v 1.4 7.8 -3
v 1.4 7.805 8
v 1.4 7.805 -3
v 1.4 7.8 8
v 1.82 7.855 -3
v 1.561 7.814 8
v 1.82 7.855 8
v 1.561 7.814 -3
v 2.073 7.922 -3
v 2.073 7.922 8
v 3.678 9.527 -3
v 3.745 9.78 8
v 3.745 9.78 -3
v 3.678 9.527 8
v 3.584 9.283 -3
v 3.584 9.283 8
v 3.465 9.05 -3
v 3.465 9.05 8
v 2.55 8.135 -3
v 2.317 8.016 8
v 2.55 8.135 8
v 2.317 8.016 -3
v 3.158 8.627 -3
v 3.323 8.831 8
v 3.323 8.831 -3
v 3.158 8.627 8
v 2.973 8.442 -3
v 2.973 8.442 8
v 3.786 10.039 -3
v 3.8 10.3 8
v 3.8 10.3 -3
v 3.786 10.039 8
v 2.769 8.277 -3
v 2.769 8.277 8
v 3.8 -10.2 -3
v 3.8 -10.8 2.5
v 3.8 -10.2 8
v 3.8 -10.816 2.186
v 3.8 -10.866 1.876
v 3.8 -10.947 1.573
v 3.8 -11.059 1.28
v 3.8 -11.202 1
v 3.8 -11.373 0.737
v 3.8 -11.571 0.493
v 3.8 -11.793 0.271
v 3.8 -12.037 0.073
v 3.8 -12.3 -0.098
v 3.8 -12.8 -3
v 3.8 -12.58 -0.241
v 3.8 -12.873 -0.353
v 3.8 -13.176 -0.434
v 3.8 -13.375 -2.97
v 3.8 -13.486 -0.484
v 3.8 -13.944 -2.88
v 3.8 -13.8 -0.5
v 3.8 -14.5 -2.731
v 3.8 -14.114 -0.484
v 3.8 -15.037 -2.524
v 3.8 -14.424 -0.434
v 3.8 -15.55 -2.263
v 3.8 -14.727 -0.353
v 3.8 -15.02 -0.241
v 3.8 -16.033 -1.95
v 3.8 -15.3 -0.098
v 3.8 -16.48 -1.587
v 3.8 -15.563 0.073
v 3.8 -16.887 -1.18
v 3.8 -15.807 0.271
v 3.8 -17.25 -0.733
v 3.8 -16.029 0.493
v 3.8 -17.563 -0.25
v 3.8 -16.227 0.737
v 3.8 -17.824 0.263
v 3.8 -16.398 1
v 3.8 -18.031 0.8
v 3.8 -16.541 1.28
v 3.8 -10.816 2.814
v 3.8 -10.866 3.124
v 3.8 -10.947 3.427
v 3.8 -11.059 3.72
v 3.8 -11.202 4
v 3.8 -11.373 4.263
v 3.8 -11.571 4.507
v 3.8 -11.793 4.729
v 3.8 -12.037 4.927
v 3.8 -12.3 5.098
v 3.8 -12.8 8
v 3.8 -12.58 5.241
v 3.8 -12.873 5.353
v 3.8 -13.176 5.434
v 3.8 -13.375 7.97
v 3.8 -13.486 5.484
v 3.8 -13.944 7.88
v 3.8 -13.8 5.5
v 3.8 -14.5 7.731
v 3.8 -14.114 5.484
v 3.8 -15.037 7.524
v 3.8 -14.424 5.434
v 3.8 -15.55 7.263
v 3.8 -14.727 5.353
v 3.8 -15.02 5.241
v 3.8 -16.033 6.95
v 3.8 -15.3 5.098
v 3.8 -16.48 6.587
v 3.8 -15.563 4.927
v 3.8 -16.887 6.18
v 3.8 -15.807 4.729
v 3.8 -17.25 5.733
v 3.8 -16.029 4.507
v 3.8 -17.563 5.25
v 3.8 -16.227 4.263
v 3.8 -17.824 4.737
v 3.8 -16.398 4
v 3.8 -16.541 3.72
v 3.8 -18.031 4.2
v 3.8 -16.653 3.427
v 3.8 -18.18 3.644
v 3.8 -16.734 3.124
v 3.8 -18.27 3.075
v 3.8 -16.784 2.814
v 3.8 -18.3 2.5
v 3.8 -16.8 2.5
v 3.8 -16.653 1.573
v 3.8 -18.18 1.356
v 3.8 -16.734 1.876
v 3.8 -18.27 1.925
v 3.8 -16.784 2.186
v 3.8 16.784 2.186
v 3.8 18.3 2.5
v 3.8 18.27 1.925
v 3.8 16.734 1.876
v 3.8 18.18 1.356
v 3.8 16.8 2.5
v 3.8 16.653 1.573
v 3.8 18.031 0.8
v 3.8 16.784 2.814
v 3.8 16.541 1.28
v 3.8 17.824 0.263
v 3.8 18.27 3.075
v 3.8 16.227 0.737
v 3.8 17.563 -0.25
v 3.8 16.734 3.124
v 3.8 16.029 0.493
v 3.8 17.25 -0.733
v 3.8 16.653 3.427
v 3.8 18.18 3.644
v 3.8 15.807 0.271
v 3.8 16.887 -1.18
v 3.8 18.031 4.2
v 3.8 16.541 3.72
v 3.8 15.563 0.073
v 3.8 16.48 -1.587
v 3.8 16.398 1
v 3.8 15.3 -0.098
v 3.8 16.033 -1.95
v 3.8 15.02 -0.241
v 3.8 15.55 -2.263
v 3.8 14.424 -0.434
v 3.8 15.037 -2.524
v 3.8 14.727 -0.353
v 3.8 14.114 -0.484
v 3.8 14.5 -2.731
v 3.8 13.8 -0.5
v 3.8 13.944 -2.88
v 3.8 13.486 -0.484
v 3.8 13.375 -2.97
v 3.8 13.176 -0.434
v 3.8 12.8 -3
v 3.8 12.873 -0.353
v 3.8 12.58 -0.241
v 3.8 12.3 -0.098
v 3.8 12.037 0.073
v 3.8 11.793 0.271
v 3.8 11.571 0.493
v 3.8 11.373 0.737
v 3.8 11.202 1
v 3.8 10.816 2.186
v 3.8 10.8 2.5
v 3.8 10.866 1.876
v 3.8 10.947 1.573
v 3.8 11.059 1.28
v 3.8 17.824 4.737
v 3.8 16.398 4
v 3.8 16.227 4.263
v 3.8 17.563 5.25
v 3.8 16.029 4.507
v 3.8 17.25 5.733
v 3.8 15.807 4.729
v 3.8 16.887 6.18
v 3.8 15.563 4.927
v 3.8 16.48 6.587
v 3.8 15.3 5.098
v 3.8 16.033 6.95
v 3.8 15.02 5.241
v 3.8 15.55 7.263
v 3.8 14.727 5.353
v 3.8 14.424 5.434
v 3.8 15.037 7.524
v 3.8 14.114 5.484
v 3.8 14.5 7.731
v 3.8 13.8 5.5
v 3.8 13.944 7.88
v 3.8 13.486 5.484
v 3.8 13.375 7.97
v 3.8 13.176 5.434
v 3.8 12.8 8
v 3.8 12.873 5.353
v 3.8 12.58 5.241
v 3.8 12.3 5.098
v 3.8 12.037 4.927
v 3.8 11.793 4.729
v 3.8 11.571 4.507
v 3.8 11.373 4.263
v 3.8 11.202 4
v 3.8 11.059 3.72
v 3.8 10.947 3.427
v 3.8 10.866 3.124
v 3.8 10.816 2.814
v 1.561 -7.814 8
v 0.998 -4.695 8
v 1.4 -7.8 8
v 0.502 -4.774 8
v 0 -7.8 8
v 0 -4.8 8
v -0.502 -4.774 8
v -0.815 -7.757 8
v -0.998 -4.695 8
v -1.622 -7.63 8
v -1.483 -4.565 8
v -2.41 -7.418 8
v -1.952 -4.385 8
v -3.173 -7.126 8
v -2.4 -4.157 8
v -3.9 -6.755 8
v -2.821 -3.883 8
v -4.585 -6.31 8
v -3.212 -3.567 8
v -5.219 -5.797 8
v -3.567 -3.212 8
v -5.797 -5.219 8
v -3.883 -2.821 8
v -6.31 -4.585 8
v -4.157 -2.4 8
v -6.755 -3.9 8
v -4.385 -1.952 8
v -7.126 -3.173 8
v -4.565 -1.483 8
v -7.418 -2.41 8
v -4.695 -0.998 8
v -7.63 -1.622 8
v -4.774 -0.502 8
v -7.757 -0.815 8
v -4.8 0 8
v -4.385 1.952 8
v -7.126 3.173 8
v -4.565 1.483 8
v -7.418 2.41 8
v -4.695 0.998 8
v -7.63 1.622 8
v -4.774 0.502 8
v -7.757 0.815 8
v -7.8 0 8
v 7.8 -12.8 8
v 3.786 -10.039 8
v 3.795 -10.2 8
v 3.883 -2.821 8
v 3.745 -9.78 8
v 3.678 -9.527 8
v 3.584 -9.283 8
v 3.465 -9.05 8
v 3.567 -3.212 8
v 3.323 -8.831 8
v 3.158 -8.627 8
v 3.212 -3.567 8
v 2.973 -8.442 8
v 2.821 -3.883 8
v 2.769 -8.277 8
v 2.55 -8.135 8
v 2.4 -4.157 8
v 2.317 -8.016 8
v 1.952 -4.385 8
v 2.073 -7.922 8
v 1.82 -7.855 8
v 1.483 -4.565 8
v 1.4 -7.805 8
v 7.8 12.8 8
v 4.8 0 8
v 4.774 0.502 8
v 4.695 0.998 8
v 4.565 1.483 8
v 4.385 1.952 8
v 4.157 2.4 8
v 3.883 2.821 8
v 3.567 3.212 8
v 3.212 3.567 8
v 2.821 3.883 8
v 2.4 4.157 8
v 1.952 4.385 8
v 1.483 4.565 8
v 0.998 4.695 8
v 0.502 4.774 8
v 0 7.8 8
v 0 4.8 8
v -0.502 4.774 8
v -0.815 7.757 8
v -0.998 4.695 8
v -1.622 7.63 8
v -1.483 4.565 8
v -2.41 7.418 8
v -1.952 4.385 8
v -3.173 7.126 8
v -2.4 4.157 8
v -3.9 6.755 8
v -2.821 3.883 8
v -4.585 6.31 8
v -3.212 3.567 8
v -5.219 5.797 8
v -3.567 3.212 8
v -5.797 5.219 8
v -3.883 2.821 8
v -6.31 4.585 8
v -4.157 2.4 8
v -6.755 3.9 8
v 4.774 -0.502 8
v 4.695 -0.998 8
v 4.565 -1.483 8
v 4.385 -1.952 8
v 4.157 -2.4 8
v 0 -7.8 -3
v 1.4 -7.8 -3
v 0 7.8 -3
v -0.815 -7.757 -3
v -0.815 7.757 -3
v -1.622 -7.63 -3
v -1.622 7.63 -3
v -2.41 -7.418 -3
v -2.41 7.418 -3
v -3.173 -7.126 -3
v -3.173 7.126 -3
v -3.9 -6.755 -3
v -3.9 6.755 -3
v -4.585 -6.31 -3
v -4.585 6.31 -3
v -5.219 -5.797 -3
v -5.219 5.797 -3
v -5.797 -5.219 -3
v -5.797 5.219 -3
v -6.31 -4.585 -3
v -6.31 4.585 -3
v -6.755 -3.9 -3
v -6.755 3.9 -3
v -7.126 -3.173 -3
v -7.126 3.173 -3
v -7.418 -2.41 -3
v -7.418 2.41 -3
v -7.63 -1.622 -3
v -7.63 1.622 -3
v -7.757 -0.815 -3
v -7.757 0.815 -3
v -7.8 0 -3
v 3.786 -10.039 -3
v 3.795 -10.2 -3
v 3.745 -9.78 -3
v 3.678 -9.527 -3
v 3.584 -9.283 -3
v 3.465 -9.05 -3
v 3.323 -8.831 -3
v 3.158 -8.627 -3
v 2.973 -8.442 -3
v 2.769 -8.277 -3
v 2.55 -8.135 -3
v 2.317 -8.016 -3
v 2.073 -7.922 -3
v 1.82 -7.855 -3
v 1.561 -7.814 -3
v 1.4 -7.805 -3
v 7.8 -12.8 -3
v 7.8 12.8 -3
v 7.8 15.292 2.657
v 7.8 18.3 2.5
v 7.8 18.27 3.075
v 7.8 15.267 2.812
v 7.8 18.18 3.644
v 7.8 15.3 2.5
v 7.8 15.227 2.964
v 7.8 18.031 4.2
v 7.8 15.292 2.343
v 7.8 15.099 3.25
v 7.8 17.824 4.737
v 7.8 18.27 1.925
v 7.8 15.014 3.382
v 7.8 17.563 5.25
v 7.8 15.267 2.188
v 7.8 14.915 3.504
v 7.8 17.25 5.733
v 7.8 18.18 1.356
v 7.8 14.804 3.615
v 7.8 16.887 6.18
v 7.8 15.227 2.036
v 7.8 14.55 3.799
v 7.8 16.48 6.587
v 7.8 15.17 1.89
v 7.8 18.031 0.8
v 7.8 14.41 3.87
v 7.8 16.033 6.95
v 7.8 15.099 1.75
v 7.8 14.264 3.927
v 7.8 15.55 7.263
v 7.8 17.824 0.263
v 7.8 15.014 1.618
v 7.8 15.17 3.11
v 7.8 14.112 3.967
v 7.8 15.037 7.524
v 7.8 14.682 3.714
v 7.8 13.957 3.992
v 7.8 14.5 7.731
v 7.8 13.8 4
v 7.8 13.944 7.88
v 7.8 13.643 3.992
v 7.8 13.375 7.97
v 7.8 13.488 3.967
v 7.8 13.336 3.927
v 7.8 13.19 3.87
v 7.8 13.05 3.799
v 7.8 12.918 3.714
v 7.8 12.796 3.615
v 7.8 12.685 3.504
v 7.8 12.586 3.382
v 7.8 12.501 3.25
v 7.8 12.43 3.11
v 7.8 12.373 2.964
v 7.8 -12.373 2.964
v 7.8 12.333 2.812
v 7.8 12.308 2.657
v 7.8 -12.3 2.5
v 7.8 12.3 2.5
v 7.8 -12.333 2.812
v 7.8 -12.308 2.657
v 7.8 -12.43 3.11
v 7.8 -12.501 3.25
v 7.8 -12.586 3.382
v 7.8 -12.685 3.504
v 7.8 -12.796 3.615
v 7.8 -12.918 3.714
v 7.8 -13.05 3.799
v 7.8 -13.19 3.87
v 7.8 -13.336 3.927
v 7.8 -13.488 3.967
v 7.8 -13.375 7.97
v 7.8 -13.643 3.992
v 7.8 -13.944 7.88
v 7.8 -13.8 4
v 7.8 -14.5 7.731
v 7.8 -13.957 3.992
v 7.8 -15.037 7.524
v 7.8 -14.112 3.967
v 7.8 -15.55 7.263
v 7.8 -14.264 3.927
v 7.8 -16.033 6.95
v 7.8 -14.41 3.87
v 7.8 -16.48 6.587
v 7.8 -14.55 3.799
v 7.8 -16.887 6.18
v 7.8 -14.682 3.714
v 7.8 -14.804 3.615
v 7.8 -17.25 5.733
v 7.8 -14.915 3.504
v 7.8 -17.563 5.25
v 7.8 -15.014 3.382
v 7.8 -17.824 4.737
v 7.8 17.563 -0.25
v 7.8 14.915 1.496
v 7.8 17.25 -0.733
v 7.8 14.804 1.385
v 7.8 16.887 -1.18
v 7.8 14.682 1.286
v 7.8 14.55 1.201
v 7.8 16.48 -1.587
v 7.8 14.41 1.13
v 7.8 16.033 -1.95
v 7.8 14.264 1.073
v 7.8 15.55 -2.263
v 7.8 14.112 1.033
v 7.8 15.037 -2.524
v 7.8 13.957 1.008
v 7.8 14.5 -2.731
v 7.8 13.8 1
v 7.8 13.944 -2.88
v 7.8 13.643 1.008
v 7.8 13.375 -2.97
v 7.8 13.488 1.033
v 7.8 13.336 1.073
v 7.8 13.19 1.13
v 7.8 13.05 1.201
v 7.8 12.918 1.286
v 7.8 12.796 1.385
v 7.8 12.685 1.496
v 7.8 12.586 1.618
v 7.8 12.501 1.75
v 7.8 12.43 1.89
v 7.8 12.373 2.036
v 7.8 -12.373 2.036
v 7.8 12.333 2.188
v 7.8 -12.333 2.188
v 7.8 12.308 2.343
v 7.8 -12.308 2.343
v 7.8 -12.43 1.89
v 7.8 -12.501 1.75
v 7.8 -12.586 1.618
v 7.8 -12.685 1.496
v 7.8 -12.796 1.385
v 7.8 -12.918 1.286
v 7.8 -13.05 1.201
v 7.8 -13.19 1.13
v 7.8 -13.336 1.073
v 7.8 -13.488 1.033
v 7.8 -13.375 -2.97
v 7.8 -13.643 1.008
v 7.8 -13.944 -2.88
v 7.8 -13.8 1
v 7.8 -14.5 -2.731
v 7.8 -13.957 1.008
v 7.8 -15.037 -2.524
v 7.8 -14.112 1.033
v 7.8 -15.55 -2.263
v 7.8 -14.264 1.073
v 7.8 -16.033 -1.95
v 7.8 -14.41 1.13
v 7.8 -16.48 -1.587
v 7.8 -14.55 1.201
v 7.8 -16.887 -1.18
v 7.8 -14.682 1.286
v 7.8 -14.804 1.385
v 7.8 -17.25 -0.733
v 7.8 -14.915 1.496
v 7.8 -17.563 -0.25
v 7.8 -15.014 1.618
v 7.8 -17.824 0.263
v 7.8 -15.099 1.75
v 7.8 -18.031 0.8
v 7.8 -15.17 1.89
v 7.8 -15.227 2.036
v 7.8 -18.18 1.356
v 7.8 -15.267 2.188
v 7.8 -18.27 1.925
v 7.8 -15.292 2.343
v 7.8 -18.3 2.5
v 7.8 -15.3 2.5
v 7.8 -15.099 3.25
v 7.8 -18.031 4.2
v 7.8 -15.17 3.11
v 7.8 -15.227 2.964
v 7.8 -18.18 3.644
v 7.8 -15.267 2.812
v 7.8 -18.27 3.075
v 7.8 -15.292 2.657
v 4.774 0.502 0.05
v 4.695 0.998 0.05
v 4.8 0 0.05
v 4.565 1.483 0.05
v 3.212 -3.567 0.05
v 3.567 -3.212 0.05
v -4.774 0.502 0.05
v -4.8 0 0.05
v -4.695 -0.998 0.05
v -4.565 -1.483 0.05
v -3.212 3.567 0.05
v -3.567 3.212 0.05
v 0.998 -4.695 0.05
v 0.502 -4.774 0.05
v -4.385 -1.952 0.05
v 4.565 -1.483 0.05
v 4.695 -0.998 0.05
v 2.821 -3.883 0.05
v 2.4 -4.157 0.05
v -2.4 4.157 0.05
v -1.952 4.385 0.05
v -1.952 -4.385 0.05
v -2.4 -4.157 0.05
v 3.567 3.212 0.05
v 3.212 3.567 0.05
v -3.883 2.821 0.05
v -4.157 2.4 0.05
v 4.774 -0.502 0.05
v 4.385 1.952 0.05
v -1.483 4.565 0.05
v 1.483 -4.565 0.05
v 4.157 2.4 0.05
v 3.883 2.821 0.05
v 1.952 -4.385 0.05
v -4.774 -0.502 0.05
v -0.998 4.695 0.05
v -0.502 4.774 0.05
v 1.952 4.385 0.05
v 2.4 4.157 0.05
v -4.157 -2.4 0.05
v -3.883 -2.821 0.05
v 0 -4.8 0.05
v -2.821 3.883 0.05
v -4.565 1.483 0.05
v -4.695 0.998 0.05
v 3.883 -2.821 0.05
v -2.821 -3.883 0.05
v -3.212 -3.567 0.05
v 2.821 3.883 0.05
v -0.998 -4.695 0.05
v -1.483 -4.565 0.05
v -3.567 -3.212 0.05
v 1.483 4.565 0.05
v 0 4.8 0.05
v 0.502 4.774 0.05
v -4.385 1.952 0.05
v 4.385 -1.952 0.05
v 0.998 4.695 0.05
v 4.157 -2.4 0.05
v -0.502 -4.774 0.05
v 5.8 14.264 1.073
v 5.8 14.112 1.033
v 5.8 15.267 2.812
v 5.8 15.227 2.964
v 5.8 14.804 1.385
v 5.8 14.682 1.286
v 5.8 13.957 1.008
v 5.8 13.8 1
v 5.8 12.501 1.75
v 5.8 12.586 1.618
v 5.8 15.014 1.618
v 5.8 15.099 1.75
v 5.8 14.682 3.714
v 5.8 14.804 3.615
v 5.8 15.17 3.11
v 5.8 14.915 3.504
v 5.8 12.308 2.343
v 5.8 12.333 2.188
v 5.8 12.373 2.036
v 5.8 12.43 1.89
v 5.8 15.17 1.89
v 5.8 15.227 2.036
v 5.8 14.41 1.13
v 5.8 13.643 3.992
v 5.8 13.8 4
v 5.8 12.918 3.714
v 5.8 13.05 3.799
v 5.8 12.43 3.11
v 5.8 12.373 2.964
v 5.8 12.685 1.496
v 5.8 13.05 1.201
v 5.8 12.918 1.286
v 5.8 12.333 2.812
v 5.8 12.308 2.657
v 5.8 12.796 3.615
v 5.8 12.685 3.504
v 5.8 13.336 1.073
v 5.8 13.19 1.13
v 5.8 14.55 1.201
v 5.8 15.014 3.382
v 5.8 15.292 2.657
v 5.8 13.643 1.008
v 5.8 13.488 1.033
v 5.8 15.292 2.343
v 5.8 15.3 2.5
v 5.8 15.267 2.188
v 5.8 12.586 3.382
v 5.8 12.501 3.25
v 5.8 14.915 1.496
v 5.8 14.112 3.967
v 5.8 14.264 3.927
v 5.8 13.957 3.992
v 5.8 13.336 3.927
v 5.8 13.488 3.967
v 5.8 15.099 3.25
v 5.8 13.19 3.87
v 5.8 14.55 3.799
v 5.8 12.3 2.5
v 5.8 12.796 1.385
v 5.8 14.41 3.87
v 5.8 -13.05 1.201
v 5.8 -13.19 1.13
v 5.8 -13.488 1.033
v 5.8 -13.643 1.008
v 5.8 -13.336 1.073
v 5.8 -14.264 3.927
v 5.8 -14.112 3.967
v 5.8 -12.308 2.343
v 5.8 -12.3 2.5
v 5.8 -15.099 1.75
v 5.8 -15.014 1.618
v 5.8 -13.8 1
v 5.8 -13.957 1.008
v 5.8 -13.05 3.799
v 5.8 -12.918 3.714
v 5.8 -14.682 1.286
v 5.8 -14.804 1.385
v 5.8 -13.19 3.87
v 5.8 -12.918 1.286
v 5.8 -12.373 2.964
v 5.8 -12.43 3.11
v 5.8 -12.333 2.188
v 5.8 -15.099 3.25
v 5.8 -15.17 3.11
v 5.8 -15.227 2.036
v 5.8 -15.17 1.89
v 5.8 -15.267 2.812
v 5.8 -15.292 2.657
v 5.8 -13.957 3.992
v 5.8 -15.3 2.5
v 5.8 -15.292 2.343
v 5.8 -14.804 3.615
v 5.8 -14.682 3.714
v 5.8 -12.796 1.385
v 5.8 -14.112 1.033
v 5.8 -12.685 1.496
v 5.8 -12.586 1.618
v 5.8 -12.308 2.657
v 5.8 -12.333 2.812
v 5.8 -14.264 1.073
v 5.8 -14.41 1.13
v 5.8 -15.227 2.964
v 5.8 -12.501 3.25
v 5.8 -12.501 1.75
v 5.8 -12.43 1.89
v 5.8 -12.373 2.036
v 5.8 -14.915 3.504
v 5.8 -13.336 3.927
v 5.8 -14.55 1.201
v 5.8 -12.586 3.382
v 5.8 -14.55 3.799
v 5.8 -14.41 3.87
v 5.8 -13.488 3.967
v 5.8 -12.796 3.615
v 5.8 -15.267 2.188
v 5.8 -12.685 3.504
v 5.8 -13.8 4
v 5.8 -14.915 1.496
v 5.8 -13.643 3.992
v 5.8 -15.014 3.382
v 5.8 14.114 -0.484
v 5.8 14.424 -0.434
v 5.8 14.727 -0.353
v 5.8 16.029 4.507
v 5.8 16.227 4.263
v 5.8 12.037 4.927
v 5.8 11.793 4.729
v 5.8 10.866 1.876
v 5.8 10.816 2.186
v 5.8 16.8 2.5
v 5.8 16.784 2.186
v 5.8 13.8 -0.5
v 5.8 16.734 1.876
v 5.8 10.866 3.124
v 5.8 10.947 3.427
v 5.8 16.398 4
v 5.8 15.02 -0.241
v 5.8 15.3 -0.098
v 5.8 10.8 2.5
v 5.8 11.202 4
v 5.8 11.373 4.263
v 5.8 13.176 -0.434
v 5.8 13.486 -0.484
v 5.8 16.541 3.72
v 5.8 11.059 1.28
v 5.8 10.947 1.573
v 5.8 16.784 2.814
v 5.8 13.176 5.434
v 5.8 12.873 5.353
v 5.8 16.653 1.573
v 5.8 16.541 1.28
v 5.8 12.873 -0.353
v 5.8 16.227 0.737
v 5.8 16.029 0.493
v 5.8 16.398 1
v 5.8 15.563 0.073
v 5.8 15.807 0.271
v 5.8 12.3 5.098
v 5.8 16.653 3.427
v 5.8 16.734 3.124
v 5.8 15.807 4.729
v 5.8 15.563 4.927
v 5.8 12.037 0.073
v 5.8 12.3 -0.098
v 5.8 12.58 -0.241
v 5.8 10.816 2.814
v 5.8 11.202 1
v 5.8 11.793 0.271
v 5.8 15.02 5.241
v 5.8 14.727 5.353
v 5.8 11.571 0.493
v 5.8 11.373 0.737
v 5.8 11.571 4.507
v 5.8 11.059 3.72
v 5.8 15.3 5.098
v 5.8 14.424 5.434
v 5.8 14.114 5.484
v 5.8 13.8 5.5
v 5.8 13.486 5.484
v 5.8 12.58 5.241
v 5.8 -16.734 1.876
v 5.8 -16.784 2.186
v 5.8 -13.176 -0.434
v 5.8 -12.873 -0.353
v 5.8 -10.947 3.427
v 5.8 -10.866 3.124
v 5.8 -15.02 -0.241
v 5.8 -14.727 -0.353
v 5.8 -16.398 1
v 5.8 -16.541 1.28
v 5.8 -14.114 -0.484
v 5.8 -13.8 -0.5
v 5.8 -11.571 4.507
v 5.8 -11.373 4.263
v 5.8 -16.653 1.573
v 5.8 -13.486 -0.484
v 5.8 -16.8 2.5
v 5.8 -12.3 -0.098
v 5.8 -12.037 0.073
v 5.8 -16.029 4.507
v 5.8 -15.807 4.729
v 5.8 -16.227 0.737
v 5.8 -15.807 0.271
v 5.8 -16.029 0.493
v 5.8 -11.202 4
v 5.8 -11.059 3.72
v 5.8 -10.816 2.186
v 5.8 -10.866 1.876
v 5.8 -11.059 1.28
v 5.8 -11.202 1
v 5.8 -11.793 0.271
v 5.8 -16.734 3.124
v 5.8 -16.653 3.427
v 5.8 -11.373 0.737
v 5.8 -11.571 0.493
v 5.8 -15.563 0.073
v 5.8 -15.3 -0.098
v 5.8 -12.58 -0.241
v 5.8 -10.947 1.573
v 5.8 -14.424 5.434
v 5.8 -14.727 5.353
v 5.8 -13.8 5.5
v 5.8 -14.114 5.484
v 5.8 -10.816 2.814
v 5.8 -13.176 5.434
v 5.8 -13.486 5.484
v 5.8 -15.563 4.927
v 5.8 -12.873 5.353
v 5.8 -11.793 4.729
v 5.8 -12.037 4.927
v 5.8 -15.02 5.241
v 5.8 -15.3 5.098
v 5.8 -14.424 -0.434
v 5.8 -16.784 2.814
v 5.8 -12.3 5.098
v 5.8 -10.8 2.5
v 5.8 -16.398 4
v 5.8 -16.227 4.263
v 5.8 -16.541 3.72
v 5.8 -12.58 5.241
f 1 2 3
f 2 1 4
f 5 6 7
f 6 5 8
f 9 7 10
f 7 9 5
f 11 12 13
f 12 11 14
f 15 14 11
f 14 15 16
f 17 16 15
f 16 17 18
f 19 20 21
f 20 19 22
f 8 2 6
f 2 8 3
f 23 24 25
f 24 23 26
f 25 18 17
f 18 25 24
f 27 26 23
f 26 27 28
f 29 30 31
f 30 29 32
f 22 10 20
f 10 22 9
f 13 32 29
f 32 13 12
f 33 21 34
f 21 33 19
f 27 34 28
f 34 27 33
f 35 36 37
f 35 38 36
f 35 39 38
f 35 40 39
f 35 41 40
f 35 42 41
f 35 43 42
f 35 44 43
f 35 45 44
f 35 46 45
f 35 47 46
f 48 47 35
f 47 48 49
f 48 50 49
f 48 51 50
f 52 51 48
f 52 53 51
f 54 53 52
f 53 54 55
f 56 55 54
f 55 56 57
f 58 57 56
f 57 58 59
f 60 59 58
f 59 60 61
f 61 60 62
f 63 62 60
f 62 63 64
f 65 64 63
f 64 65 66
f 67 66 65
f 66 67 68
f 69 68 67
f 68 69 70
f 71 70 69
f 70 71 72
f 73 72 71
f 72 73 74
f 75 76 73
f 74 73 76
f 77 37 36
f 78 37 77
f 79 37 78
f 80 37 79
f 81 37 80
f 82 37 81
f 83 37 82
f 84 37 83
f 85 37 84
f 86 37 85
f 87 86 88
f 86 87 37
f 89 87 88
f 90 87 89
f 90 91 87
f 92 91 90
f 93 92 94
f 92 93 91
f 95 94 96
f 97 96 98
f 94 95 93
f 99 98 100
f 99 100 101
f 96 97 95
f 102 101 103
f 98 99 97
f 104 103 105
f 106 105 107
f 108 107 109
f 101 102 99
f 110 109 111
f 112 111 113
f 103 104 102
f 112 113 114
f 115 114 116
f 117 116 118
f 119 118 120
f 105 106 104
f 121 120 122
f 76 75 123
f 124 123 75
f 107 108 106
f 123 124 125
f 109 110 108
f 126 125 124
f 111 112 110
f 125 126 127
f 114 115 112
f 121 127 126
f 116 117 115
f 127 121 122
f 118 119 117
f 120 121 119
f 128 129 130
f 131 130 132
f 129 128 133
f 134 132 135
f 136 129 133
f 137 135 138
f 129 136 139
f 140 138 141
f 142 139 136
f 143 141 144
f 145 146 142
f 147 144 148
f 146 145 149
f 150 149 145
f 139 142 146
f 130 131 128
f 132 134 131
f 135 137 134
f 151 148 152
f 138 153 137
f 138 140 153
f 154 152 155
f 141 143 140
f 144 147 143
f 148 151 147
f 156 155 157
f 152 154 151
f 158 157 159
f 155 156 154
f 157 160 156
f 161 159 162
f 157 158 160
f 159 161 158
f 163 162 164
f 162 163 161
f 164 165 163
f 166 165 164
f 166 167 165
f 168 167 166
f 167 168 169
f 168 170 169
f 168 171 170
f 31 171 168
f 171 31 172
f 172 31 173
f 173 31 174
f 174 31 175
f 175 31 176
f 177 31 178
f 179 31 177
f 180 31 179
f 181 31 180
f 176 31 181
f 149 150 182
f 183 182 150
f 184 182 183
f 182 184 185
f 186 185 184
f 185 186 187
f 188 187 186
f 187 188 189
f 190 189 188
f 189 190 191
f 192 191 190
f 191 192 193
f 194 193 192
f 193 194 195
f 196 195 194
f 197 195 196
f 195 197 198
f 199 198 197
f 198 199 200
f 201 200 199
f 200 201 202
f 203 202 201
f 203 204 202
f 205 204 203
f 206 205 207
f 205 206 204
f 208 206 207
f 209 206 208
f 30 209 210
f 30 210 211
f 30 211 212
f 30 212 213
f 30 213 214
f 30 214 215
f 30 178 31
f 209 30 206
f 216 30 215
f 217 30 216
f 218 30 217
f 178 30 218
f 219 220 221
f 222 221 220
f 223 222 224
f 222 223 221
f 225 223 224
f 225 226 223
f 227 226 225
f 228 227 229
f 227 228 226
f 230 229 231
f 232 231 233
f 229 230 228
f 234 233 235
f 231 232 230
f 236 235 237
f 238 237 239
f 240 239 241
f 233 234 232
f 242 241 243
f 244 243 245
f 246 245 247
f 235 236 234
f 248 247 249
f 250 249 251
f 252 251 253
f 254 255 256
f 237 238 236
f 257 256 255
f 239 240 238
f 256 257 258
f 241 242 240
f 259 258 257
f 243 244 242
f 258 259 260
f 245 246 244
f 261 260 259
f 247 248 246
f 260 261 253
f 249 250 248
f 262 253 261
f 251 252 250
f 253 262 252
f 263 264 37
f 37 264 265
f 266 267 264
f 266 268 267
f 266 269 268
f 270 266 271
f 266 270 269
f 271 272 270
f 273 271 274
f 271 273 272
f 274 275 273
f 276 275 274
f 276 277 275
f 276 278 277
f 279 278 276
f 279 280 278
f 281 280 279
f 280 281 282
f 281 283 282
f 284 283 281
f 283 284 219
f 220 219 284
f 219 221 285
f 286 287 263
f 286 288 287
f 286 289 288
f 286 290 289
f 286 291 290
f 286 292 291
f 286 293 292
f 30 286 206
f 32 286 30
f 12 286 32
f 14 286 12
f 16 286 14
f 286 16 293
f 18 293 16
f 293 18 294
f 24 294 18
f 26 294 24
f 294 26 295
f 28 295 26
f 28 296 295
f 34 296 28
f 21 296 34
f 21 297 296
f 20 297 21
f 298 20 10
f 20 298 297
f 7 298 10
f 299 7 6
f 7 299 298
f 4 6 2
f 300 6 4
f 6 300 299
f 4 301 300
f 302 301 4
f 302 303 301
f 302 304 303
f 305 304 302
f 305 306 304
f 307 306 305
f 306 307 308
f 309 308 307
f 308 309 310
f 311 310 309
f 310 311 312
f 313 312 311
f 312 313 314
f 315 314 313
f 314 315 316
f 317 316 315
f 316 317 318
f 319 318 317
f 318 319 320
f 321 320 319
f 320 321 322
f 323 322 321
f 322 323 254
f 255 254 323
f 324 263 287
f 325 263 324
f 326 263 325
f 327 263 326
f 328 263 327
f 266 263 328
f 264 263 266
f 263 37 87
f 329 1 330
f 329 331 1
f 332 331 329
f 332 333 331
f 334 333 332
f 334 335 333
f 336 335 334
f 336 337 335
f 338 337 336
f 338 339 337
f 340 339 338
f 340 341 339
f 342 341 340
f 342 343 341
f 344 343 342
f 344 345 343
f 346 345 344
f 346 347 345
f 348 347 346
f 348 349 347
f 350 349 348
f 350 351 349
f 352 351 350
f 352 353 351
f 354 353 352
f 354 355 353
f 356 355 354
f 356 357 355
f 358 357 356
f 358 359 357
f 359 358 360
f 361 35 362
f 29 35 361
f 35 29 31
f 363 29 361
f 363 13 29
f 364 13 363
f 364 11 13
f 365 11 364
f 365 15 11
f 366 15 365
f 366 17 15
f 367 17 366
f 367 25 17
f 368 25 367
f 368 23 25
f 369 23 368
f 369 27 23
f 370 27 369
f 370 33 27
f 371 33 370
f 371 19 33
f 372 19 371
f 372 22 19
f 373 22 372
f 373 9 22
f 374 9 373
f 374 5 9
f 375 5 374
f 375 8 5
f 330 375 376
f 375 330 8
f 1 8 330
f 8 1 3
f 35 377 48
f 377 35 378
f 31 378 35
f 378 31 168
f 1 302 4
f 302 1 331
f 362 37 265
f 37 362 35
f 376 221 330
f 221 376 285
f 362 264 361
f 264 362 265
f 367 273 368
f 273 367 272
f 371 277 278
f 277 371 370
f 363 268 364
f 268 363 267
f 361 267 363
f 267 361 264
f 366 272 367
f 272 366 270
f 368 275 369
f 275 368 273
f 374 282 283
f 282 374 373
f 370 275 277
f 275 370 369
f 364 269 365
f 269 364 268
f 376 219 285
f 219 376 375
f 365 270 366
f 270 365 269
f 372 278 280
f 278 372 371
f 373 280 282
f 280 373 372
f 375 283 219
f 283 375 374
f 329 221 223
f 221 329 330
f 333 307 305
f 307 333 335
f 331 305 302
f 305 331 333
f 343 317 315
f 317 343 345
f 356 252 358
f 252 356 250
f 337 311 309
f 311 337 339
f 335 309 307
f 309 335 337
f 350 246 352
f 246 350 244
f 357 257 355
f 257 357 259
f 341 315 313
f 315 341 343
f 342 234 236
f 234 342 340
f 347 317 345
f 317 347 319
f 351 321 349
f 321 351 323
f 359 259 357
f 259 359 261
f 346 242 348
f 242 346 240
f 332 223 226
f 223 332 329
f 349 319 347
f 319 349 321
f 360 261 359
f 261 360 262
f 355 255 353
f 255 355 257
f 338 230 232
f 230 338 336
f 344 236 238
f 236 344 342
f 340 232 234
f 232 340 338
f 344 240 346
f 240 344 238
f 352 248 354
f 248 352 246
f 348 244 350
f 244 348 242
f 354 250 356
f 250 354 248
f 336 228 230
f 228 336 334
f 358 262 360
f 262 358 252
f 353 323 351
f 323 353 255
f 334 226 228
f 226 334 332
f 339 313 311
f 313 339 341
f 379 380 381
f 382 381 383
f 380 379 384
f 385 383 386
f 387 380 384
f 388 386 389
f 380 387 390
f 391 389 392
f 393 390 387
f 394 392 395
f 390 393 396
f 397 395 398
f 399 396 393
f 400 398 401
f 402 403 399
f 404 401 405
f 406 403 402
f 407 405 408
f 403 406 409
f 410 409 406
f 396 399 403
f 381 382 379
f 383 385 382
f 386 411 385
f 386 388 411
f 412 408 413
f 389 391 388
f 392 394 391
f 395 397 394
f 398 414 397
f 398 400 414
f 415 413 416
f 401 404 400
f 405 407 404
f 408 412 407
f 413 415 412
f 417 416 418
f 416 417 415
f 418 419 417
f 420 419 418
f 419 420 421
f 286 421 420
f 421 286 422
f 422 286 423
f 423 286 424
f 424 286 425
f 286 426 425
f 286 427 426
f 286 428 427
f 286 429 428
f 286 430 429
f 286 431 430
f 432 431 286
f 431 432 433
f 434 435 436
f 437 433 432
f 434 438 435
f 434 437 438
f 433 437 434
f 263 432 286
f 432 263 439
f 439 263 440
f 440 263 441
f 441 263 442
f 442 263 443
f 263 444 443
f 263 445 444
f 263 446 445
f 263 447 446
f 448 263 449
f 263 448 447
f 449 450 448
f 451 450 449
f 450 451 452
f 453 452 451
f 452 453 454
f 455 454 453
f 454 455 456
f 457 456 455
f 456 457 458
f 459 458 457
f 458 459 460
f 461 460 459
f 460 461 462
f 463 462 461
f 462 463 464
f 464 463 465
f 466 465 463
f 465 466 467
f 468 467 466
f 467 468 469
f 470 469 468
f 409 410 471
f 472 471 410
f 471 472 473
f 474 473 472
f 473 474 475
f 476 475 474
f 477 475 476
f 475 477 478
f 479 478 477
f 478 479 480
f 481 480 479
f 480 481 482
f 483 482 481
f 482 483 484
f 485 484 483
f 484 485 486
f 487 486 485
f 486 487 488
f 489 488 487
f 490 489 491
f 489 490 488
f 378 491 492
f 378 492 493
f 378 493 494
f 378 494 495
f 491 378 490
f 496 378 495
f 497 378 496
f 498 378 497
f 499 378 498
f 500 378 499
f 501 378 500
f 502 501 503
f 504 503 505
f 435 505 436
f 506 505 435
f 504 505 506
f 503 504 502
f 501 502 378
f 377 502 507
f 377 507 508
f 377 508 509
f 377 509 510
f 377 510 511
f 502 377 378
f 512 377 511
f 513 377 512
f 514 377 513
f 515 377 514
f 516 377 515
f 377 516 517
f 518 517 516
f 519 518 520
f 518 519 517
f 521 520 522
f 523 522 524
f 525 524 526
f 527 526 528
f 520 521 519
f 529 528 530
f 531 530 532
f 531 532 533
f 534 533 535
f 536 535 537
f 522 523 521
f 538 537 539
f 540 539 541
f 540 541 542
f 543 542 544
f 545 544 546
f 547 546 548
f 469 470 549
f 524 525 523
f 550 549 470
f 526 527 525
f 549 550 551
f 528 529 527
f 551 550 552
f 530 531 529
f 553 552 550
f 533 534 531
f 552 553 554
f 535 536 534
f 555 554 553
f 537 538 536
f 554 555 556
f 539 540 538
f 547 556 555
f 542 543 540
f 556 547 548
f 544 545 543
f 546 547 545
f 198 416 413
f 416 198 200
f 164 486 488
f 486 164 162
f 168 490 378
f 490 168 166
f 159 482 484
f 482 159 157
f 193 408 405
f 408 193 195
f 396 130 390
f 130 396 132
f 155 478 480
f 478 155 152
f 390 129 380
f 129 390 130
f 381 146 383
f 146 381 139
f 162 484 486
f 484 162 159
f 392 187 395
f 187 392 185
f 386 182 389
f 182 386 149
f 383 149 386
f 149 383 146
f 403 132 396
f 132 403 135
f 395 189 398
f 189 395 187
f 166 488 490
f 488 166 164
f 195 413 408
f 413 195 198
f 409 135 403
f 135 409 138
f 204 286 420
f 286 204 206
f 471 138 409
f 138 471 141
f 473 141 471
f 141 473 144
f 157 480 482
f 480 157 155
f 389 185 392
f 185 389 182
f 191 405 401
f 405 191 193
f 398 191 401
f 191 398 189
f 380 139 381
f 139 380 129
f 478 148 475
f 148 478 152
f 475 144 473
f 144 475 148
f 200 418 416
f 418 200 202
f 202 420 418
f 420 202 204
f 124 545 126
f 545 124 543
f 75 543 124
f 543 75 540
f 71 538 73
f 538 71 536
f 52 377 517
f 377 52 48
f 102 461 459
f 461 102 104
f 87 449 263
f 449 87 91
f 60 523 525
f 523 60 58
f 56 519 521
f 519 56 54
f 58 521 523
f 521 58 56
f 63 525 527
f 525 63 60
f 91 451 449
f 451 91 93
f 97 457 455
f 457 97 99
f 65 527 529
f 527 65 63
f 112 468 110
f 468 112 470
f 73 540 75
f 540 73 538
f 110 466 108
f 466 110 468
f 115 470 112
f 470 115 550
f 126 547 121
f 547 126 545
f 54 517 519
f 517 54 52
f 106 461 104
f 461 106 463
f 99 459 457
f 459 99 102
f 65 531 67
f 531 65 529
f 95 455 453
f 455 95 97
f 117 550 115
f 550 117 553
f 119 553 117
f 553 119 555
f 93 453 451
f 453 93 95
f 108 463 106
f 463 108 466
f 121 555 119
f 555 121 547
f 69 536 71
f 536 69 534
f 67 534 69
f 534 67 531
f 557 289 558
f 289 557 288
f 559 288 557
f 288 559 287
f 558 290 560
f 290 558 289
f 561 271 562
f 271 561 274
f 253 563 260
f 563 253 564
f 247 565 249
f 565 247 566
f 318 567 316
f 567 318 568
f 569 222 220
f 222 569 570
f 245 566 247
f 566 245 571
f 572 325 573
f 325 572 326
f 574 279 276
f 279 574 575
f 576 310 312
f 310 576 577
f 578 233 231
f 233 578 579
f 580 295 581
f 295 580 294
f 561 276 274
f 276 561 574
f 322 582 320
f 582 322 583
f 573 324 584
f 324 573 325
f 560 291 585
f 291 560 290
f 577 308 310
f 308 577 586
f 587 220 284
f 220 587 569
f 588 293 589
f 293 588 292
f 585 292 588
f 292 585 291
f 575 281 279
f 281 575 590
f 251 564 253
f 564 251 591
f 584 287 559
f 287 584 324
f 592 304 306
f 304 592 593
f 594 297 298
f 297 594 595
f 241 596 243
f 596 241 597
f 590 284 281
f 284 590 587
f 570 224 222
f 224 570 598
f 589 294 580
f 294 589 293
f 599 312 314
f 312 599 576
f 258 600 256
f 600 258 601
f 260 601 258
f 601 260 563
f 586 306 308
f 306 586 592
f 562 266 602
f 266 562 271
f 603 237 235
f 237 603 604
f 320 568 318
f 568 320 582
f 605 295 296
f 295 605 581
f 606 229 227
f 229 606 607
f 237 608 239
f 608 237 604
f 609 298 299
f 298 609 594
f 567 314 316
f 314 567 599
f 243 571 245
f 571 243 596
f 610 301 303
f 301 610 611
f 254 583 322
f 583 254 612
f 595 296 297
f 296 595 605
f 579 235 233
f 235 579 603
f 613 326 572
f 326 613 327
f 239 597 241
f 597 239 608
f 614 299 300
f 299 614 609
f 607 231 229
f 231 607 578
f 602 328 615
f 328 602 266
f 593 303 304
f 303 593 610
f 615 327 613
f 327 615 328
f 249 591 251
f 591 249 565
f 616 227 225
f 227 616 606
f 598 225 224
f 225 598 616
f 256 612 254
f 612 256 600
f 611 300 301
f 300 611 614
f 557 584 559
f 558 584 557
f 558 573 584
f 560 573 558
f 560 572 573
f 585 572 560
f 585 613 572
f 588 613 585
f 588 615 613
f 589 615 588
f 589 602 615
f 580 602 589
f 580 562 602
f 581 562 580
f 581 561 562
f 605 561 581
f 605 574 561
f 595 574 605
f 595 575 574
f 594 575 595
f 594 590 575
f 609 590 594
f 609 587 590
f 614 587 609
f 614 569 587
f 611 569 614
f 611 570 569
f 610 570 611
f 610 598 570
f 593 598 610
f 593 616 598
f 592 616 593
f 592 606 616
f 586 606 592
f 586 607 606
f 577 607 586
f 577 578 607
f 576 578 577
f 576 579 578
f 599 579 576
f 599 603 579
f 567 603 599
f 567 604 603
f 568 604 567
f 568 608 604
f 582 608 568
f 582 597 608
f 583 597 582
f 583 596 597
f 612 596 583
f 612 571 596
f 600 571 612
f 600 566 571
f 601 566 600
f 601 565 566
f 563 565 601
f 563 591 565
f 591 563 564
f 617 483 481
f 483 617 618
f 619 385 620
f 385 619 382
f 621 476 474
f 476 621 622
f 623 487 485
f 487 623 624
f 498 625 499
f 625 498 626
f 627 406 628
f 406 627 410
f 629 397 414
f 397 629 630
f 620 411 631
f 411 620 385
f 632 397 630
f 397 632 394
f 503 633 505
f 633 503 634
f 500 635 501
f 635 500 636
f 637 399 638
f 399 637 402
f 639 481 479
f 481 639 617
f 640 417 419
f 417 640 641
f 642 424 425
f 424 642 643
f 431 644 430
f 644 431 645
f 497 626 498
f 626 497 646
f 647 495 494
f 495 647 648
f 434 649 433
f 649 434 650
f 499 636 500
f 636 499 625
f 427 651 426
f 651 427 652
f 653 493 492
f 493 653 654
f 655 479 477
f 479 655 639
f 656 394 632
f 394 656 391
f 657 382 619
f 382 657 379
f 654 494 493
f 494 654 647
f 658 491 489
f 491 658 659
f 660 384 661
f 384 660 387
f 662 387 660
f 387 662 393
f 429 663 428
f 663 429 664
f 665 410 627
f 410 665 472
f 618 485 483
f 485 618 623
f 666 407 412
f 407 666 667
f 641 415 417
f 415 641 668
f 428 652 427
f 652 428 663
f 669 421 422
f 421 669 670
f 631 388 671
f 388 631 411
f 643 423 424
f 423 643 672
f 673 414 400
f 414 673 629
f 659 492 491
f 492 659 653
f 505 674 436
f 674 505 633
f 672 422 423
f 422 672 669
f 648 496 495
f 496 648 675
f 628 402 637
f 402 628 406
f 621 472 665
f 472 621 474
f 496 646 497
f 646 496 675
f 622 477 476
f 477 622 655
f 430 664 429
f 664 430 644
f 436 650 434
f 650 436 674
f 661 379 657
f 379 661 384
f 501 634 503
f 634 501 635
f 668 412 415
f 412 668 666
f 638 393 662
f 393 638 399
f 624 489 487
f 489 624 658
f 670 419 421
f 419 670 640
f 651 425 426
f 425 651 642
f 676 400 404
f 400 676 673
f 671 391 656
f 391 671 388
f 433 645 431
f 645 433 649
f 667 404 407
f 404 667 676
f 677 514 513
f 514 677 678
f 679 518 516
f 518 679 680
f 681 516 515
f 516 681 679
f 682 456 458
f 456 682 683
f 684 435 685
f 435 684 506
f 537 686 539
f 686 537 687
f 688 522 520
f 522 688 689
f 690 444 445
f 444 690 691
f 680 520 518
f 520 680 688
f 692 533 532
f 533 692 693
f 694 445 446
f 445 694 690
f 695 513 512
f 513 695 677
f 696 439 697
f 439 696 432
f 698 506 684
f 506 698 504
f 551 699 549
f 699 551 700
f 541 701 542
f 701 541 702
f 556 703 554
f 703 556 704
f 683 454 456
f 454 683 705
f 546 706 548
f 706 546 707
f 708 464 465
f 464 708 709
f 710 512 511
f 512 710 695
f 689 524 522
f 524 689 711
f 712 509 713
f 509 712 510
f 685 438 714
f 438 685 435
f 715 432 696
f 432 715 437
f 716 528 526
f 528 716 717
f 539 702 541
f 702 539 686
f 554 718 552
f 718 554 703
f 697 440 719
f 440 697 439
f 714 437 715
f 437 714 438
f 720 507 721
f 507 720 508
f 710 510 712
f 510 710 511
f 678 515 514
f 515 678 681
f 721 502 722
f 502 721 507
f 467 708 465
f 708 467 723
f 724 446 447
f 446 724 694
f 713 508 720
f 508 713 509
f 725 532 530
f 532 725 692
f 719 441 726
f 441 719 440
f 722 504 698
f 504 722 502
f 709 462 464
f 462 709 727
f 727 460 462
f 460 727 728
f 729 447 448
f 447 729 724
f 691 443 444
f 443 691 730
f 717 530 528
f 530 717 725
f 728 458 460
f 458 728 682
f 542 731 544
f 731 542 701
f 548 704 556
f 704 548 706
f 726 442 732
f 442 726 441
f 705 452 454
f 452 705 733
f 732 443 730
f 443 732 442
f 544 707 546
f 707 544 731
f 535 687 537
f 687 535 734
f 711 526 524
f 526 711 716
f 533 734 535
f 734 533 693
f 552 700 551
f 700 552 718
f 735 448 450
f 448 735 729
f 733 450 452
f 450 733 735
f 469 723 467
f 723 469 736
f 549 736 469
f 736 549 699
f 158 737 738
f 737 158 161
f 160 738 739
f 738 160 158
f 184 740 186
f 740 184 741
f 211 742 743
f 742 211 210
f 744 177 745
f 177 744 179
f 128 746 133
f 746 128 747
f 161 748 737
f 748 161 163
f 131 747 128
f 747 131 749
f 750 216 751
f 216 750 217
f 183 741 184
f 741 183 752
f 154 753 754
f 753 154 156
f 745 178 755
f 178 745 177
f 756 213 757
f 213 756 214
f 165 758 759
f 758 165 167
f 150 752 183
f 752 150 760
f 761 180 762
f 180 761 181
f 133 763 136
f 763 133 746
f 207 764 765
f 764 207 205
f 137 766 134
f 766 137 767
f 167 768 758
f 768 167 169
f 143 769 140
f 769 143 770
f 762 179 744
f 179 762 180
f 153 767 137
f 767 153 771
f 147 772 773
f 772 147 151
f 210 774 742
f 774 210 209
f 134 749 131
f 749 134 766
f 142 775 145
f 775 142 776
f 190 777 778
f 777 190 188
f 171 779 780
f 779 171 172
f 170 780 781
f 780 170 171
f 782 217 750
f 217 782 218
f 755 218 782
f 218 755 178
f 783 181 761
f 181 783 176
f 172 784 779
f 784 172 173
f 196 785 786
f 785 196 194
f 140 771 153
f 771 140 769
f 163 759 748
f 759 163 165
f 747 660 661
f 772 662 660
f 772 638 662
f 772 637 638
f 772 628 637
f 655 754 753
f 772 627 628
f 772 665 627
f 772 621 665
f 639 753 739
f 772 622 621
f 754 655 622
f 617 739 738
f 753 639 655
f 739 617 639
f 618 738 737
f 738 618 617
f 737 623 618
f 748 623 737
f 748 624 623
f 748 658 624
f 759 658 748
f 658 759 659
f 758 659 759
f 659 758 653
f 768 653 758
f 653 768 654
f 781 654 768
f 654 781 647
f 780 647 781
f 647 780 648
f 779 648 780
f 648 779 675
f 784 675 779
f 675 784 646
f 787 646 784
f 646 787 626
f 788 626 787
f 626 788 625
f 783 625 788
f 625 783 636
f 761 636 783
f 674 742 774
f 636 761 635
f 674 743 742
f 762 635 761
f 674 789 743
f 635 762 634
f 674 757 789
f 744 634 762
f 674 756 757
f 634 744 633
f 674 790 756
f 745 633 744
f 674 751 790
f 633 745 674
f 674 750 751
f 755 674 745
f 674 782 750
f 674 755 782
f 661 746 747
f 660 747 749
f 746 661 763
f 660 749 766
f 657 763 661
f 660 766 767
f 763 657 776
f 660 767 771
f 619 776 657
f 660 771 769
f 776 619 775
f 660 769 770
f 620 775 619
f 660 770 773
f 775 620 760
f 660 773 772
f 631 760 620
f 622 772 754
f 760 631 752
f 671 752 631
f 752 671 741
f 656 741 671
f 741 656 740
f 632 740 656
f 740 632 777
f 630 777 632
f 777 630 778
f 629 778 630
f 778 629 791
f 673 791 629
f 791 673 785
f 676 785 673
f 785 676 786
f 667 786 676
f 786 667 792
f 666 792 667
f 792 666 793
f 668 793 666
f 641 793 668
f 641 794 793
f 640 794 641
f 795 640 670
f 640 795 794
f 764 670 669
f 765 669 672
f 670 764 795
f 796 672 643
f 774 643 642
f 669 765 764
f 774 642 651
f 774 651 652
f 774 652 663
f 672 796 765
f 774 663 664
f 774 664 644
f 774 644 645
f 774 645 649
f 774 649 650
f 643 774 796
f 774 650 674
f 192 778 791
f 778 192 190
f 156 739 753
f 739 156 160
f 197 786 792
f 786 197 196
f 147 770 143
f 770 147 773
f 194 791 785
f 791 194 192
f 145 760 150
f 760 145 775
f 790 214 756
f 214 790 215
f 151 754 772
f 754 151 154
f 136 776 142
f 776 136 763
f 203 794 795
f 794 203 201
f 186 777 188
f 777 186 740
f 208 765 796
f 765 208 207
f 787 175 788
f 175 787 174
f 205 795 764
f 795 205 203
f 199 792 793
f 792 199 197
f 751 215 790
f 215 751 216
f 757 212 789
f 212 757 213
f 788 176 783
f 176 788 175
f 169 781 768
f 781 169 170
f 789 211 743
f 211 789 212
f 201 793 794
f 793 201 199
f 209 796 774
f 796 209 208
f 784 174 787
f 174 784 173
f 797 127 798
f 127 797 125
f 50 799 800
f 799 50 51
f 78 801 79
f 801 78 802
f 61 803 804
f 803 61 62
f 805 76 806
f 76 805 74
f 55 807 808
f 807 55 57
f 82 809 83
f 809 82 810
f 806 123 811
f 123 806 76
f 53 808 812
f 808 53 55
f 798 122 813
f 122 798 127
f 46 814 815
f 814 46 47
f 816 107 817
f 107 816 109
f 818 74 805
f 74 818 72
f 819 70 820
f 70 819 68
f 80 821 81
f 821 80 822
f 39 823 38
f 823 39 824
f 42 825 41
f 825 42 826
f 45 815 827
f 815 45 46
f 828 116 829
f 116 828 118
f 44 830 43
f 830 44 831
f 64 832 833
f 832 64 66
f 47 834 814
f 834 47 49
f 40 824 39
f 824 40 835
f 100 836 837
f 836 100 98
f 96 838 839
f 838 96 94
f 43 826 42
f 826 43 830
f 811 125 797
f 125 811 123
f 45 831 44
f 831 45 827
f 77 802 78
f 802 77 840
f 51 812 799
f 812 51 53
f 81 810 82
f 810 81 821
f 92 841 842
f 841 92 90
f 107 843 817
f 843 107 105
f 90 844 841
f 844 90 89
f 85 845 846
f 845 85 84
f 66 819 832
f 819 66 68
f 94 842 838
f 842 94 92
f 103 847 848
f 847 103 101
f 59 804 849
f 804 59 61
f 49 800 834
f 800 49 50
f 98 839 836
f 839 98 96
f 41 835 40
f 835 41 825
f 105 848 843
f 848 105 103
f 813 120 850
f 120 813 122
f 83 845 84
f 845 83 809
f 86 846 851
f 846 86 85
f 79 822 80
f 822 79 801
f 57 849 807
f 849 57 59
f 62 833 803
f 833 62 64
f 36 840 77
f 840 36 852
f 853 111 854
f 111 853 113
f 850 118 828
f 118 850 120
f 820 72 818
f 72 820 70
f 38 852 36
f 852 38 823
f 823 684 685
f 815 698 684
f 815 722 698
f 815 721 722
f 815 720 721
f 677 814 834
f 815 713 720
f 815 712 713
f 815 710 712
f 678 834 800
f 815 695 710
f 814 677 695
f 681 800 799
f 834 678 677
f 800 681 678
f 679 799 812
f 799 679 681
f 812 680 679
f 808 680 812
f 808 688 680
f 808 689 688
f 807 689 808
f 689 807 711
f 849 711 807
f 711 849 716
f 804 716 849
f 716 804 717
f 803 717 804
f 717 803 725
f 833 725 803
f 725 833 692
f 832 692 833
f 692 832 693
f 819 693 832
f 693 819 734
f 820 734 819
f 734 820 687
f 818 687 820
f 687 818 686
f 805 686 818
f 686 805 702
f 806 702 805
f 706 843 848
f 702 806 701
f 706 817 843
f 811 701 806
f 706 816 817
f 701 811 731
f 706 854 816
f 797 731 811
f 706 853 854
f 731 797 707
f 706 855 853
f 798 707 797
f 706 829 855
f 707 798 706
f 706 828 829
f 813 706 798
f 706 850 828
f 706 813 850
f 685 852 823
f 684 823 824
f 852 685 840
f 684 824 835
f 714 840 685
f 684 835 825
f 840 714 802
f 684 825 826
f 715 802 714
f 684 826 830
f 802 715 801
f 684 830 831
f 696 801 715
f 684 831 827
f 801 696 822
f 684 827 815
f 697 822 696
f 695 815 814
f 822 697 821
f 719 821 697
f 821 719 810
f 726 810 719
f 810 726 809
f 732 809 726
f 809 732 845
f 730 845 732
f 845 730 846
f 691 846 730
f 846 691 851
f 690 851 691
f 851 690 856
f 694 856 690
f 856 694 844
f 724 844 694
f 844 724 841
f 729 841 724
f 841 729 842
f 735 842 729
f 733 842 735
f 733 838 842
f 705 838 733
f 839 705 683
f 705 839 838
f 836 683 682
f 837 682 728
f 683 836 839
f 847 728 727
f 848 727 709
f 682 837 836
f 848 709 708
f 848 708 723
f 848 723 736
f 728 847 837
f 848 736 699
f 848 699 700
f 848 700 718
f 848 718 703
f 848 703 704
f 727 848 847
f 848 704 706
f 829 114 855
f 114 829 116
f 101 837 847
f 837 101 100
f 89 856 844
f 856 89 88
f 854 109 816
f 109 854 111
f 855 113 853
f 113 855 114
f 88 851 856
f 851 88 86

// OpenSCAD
// ----------------------------------------------------------------
// Customizable Socket Organizers: Circular End Cap with Dual Mount
// ----------------------------------------------------------------
//
// Zemba Craftworks
// youtube.com/zembacraftworks
// thingiverse.com/zembacraftworks/about

// This is a configurable, 3D printable insert designed to
// slide onto a metal or wooden bar to create socket set
// organizers. Dimensions can be adjusted for sockets of
// all sizes and to slide onto bars/holders of any size.

// Date Created:  2019-01-03
// Last Modified: 2019-01-03

// Critical Dimensions
// -------------------
// Adjust these dimensions and verify them with a test print
// before printing holders for all of your sockets! You want a
// snug fit but not so tight that anything gets stuck. These
// values will vary depending on your sockets, the rail you're
// using, and the calibration of your printer.


rr = 4.8;           // Dowel Radius (mm)
                    // (4.8 = approximately 3/8 in * 25.4 mm/in / 2)
fn1 = 60;           // Number of Facets for Curvature 

ct = 3;             // Wall Thickness of End Cap (mm)
ch = 8;             // Height of End Cap (mm)
       
hd1 = 3;            // Mounting Hole Diameter (Through-hole)
hd2 = 6;            // Mounting Hole Diameter (Counterbore)

hz = 1;             // Mounting Hole Offset Distance
hx = 2;             // Mounting Hole Counterbore Depth

f1 = 4;             // Flange Thickness
f2 = 5;             // Flange Width (Extra)
f3 = 5;             // Flange Fillet

// Tolerance Value
// ---------------
// When shapes are subtracted through difference() in
// OpenSCAD, there is ambiguity if any faces of the two shapes
// occupy the same space. Adding a small value 't' to make
// the subtracted shape slightly larger prevents this.

t = 0.1;

// Create End Cap

    // Dowel Clamp
    difference(){ 
        union(){

            // Main Dowel Clamp
            cylinder(r=rr+ct,h=ch,$fn=fn1);

            // Main Dowel Cap
            translate([0,0,-ct])
                cylinder(r=rr+ct,h=ct,$fn=fn1);

            // Corner Volume
            translate([0,-rr-ct,-ct ])
                cube([(rr+ct),2*(rr+ct),ch+ct]);

            // Mounting Flange
            translate([rr+ct-f1,-rr-ct-f2,-ct])
                cube([f1,2*rr+2*ct+2*f2,ch+ct]);
            translate([rr+ct-f1,rr+ct+f2,(ct+ch)/2-ct])
                rotate([0,90,0])
                cylinder(r=(ct+ch)/2,h=f1,$fn=fn1);
            translate([rr+ct-f1,-rr-ct-f2,(ct+ch)/2-ct])
                rotate([0,90,0])
                cylinder(r=(ct+ch)/2,h=f1,$fn=fn1);

            // (Optional) Square Edges on Flange
            // Top (+z)
            //translate([rr+ct-f1,-rr-ct-f2-(ch+ct)/2,-ct+(ch+ct)/2])
            //    cube([f1,2*rr+2*ct+2*f2+ch+ct,(ch+ct)/2]);
            // Bottom (-z)
            //translate([rr+ct-f1,-rr-ct-f2-(ch+ct)/2,-ct])
            //    cube([f1,2*rr+2*ct+2*f2+ch+ct,(ch+ct)/2]);

            // Flange Fillet 1
            difference(){
            translate([rr+ct-f1-f3,rr+ct,-ct])
                cube([f3,f3,ct+ch]);
            union(){
            translate([rr+ct-f1-f3-f3/2,rr+ct+f3/2,-ct-t/2])
                cube([1.5*f3+t,f3+t,ct+ch+t]);
            translate([rr+ct-f1-f3-f3/2,rr+ct-t/2,-ct-t/2])
                cube([f3+t,1.5*f3+t,ct+ch+t]);
            translate([rr+ct-f1-f3/2,rr+ct+f3/2,-ct-t/2])
                cylinder(r=f3/2,h=ct+ch+t,$fn=fn1);}} 
           
            // Flange Fillet 2
            difference(){
            translate([rr+ct-f1-f3,-rr-ct-f3,-ct])
                cube([f3,f3,ct+ch]);
            union(){
            translate([rr+ct-f1-f3-f3/2,-rr-ct-f3-f3/2,-ct-t/2])
                cube([1.5*f3+t,f3+t,ct+ch+t]);
            translate([rr+ct-f1-f3-f3/2,-rr-ct-f3-f3/2,-ct-t/2])
                cube([f3+t,1.5*f3+t,ct+ch+t]);
            translate([rr+ct-f1-f3/2,-rr-ct-f3/2,-ct-t/2])
                cylinder(r=f3/2,h=ct+ch+t,$fn=fn1);}}
        }

        union(){  
            // Dowel Volume
            translate([0,0,t/2])
            cylinder(r=rr,h=ch+t,$fn=fn1);

            // Mounting Holes
            translate([rr+ct-f1,rr+ct+f2+hz,ch-(ch+ct)/2])
            rotate([0,90,0])
            cylinder(r=hd1/2,h=f1+t,$fn=fn1);

            translate([rr+ct-f1,-(rr+ct+f2+hz),ch-(ch+ct)/2])
            rotate([0,90,0])
            cylinder(r=hd1/2,h=f1+t,$fn=fn1);

            // Mounting Hole Counterbore
            translate([rr+ct-f1-t,rr+ct+f2+hz,ch-(ch+ct)/2])
            rotate([0,90,0])
            cylinder(r=hd2/2,h=hx+t,$fn=fn1);

            translate([rr+ct-f1-t,-(rr+ct+f2+hz),ch-(ch+ct)/2])
            rotate([0,90,0])
            cylinder(r=hd2/2,h=hx+t,$fn=fn1);
        }
    }
